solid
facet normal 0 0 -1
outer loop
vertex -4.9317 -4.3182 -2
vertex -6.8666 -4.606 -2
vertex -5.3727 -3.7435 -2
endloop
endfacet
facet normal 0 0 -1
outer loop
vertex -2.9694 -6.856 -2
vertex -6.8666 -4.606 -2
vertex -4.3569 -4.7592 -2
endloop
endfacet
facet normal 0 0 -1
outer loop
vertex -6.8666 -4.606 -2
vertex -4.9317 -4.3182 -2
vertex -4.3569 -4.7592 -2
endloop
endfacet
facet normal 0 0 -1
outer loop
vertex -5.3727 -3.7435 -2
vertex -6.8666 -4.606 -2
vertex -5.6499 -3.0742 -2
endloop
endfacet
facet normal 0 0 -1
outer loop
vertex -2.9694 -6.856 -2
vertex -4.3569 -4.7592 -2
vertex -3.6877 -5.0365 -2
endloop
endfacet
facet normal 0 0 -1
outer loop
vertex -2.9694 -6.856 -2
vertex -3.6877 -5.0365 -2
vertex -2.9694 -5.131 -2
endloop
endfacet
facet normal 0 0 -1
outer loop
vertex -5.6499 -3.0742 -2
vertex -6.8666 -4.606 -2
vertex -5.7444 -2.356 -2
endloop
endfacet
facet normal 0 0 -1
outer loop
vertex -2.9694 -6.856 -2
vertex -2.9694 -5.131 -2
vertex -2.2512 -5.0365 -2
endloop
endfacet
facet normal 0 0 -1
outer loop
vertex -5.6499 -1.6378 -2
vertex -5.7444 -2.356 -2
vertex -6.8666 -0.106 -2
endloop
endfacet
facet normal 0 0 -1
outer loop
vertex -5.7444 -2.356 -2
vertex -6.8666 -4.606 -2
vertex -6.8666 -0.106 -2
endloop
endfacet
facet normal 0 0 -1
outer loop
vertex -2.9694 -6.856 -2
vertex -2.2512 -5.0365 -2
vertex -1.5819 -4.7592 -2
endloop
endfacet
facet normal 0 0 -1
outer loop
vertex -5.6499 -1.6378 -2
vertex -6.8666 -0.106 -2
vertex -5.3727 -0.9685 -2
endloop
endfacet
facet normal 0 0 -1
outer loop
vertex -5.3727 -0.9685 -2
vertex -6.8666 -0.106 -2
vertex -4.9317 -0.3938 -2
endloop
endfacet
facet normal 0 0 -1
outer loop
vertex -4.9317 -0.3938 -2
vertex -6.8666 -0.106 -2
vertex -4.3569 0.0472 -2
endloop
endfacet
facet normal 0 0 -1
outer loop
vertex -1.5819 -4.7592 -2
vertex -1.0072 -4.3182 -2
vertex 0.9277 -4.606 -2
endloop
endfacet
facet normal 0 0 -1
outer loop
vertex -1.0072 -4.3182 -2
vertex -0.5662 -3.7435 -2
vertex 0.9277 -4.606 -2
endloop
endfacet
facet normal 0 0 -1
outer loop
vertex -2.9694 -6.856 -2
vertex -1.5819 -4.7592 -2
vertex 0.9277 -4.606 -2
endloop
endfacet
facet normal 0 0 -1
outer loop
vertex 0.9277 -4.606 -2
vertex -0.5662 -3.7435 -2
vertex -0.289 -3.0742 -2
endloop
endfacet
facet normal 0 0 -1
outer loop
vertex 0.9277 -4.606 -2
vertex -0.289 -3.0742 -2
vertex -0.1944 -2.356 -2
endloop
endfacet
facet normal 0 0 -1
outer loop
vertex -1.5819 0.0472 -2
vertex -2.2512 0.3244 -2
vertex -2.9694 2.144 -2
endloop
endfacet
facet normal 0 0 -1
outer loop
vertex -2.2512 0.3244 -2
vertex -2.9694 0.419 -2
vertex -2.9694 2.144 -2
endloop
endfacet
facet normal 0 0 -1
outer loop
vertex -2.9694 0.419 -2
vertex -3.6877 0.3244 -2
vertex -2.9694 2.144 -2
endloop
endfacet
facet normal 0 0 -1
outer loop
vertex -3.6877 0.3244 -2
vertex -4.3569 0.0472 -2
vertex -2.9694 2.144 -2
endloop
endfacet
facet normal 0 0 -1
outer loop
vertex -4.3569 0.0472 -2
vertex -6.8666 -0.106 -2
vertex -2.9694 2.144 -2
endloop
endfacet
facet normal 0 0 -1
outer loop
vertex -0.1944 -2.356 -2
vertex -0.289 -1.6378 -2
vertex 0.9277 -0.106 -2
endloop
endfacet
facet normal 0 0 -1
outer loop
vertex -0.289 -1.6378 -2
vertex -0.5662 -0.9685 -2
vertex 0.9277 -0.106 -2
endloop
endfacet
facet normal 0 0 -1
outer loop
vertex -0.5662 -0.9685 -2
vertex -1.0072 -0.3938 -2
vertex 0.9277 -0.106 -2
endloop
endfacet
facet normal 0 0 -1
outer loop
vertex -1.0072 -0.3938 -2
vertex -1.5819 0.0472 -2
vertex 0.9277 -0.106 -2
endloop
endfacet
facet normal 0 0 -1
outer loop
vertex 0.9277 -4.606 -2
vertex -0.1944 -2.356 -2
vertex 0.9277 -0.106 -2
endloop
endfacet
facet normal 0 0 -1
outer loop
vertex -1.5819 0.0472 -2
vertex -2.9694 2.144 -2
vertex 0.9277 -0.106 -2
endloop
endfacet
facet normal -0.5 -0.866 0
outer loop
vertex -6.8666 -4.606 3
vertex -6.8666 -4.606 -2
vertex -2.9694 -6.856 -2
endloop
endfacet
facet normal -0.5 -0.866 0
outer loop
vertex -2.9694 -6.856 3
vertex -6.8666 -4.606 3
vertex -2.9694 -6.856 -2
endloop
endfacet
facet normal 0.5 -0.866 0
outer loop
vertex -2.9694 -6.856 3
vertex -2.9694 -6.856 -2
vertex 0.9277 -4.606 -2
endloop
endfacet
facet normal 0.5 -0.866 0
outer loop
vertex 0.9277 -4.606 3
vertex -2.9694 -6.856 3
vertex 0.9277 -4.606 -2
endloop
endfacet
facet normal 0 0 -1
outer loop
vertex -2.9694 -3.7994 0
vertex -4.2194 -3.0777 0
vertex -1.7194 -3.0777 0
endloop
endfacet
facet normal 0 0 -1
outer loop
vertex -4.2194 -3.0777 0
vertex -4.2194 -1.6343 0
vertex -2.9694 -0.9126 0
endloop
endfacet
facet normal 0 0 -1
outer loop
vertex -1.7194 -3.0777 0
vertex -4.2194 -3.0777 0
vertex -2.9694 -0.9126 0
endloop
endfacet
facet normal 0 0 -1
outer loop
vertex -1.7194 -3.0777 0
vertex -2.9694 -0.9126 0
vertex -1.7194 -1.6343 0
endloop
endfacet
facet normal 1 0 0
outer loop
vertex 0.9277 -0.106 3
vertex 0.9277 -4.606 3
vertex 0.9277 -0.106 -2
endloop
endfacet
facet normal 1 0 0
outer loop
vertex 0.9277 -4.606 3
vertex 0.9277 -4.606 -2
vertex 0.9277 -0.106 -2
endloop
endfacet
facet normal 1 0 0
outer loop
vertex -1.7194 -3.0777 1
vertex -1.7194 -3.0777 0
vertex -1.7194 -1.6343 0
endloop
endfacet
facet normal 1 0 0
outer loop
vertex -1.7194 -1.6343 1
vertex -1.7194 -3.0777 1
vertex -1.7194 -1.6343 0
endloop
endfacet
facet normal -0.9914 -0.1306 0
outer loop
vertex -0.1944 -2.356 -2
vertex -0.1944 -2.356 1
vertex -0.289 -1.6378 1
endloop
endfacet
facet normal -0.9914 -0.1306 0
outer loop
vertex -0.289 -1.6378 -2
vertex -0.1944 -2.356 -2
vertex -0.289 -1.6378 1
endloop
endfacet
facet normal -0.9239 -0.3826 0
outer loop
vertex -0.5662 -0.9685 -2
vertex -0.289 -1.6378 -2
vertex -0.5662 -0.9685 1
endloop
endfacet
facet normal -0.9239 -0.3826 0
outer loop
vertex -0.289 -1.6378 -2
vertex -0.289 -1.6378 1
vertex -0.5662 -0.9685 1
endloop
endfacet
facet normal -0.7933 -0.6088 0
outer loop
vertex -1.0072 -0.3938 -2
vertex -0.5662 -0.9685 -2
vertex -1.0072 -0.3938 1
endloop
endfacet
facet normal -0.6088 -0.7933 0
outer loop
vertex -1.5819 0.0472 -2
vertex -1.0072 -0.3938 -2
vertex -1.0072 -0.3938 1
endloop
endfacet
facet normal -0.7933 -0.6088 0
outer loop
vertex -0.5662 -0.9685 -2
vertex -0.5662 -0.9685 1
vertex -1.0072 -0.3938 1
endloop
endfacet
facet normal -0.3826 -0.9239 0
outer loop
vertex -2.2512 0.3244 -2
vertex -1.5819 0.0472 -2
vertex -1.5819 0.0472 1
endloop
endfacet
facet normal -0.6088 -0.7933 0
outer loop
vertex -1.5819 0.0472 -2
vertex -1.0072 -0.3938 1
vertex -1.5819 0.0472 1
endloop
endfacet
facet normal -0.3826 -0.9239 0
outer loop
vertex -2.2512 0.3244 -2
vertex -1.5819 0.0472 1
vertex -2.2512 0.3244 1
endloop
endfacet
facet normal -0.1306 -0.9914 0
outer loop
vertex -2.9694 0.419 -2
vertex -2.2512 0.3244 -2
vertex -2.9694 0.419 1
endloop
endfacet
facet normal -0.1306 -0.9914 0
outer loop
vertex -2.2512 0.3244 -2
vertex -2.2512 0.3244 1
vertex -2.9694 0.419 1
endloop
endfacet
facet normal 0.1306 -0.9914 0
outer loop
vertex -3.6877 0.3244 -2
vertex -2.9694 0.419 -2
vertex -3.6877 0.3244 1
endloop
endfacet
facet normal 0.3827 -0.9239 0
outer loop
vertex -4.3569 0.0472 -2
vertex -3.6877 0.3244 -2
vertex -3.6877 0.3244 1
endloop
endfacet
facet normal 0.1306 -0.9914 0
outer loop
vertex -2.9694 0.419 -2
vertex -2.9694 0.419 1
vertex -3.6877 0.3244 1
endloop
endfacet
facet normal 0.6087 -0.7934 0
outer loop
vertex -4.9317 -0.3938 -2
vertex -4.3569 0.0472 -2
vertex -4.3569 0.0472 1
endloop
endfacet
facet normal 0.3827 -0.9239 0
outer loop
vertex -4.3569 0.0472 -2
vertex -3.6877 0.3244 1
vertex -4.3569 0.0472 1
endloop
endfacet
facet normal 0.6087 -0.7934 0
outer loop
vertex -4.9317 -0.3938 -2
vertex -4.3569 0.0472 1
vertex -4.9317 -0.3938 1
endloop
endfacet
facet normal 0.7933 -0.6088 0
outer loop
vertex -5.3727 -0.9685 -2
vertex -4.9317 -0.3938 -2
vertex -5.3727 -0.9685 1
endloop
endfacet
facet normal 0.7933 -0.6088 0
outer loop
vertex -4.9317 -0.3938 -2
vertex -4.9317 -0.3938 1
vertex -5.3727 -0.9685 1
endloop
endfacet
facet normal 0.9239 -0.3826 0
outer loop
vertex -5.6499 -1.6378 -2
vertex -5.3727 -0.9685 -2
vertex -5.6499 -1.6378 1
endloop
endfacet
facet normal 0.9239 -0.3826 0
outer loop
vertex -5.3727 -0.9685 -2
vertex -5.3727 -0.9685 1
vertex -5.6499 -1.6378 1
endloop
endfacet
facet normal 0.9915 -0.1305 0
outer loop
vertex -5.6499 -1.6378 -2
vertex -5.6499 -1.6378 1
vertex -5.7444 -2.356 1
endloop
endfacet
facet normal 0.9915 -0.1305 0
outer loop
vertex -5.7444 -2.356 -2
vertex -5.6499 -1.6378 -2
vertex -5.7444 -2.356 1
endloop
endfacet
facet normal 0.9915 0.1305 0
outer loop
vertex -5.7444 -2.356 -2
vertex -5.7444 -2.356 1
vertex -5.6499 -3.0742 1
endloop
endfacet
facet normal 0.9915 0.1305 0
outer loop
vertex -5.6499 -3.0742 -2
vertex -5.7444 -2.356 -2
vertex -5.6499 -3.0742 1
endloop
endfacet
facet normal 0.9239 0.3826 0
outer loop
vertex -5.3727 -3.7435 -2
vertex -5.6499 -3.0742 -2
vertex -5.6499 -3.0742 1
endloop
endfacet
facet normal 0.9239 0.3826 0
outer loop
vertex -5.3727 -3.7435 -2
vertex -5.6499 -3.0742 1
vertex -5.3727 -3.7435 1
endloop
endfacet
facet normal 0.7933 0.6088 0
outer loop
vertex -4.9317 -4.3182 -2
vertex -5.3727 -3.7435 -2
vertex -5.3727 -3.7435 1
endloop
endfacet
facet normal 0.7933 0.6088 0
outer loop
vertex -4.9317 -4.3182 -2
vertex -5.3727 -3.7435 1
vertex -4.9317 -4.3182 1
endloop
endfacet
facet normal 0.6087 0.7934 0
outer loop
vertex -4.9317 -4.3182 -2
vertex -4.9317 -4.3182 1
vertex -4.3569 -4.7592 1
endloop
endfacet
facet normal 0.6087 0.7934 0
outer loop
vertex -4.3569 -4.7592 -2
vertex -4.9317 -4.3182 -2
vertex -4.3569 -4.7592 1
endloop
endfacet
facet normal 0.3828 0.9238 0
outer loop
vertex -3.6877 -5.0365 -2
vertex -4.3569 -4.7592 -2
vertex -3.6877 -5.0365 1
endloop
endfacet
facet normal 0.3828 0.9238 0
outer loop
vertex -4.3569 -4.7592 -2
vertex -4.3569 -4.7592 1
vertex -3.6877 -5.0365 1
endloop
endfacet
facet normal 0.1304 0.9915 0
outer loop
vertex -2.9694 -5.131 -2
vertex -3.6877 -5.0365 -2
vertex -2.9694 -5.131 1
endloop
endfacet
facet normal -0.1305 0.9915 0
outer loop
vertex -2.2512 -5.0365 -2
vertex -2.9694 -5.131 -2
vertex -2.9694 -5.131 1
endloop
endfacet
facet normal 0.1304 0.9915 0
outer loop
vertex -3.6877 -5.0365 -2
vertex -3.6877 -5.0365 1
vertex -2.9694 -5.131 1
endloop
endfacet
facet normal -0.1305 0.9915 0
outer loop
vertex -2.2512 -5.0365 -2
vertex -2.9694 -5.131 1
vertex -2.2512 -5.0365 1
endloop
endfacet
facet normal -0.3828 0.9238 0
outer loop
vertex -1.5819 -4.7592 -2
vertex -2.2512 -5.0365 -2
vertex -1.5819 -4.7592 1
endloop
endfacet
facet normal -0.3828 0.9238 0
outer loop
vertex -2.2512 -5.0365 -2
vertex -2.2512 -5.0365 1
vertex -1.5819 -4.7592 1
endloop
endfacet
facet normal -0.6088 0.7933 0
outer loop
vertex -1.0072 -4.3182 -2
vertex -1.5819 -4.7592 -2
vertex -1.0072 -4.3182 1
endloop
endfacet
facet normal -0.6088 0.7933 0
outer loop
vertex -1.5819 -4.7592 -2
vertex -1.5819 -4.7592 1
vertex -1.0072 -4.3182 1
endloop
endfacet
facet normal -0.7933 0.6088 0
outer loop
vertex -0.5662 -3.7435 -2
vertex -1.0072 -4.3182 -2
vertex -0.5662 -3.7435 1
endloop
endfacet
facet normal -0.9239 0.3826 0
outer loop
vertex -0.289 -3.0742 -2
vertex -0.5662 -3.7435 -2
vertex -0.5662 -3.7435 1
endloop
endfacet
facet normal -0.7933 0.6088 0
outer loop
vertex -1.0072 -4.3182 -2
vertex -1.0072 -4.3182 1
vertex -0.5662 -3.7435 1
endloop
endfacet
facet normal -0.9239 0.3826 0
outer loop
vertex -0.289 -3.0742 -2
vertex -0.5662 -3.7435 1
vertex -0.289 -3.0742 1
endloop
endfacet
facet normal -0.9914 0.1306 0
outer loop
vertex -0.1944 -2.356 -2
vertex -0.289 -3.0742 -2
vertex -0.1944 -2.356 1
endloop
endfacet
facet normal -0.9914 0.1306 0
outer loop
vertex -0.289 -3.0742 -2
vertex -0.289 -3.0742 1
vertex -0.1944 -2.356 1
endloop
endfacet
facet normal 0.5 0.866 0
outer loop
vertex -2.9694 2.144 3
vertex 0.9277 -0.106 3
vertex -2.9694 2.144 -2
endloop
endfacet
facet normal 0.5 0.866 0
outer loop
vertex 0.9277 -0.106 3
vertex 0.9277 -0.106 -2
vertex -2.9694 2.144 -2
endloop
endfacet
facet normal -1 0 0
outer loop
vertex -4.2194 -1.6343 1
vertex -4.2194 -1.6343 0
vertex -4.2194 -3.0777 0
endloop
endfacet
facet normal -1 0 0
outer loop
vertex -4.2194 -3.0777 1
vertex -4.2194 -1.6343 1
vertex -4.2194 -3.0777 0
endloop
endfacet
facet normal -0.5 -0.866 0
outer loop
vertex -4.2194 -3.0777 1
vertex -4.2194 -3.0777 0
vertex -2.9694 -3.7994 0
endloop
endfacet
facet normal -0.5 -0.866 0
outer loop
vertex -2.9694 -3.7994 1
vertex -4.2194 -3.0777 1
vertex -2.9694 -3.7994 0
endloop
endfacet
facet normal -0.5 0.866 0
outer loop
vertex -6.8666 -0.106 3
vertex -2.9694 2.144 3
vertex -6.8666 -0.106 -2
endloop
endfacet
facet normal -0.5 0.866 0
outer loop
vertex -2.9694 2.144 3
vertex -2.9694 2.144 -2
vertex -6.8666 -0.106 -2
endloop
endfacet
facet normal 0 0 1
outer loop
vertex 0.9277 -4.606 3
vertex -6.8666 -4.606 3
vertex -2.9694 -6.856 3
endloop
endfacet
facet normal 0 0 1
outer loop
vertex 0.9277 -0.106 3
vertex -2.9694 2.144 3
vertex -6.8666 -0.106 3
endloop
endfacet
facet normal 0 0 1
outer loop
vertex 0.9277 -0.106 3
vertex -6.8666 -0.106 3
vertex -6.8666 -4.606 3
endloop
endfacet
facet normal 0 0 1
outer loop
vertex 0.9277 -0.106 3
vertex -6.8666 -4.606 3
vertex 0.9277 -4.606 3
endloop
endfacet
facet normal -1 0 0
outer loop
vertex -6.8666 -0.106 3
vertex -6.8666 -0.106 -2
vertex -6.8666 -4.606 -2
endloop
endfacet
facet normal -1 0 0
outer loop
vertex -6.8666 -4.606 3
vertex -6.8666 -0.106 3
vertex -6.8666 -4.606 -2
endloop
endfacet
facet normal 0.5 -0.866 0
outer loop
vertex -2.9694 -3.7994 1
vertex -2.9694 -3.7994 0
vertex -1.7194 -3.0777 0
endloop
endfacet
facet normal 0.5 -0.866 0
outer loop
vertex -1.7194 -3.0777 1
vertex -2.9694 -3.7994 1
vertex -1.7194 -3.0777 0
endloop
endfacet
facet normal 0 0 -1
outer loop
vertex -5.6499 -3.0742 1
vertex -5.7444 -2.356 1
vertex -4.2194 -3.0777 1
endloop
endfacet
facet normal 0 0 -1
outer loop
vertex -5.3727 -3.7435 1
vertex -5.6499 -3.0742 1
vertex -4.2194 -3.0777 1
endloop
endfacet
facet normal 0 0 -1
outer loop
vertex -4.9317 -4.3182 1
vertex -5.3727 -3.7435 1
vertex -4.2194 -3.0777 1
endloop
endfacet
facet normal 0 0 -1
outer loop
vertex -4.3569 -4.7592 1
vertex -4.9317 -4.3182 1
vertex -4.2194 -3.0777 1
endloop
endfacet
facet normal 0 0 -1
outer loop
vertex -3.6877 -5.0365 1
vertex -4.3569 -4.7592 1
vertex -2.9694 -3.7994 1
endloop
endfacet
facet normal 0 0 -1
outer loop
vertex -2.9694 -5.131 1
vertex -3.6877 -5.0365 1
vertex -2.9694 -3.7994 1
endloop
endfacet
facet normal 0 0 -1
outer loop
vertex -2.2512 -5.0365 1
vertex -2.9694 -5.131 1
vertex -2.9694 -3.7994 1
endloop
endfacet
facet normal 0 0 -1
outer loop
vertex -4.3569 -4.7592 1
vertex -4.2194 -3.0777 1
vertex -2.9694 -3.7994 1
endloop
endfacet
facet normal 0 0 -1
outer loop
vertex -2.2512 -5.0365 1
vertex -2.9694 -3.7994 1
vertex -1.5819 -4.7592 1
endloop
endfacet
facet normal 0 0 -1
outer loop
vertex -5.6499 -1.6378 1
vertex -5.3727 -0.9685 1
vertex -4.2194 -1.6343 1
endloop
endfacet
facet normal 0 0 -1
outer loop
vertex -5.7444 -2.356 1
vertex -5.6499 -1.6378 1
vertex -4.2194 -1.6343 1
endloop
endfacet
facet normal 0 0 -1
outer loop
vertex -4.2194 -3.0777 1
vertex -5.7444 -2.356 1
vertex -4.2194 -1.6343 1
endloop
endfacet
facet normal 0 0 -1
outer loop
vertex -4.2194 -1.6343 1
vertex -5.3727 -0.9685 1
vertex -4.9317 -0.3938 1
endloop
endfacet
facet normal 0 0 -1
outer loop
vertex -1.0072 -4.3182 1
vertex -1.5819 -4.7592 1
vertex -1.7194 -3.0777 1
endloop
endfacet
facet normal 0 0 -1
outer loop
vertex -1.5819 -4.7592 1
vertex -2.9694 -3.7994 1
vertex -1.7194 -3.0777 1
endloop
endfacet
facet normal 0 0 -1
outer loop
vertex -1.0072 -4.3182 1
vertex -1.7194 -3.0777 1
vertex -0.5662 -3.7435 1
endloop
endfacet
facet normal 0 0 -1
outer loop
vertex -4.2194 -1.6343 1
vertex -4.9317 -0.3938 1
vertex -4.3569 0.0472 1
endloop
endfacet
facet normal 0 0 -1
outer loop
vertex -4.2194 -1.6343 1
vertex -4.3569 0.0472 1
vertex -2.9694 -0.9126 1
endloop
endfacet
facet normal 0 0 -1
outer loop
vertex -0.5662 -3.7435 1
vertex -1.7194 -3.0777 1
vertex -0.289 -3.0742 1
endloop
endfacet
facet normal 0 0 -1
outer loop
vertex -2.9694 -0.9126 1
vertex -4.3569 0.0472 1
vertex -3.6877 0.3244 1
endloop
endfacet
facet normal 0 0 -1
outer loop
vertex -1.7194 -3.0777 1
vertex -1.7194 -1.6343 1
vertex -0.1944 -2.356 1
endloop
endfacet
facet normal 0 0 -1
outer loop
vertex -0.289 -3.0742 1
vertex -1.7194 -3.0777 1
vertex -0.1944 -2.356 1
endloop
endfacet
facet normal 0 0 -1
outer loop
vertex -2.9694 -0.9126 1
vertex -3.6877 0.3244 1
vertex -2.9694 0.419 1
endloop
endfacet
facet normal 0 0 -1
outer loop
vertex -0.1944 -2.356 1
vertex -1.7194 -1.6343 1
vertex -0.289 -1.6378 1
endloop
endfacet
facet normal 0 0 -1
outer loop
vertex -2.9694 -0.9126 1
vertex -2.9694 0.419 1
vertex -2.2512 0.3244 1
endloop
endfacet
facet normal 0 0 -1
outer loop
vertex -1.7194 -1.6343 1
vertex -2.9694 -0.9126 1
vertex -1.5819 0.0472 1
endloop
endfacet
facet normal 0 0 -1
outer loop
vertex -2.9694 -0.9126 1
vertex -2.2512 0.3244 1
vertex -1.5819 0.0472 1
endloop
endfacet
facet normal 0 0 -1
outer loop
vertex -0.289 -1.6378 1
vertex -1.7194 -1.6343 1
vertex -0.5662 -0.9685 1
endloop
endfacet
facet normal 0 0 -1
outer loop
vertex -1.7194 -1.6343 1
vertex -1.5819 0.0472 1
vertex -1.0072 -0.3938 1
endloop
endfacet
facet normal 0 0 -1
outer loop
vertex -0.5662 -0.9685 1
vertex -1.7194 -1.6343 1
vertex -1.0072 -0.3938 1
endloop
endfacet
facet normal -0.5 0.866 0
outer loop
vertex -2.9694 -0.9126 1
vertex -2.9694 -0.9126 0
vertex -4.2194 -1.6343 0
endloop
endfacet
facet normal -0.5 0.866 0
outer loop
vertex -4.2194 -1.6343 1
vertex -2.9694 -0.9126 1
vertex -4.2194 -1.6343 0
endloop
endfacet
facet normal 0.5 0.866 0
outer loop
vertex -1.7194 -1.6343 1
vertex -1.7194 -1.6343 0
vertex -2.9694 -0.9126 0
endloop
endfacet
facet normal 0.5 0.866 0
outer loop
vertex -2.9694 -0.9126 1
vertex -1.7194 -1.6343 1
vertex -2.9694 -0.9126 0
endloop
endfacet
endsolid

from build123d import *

# Parameters (mm, degrees)
BOSS_EXTRUDE1_DEPTH = 1
SKETCH2_R           = 2.775
BOSS_EXTRUDE2_DEPTH = 3
BOSS_EXTRUDE3_DEPTH = 2


with BuildPart() as part:
    # Sketch1 → Boss-Extrude1 (new body)
    with BuildSketch(Plane.XY):
        Polygon((-1.71944816, -3.077706513), (-1.71944816, -1.63433084), (-2.96944816, -0.912643004), (-4.21944816, -1.63433084), (-4.21944816, -3.077706513), (-2.96944816, -3.79939435), align=None)
    extrude(amount=BOSS_EXTRUDE1_DEPTH)



with BuildPart() as body_2:
    # Sketch2 → Boss-Extrude2 (new body)
    with BuildSketch(Plane.XY.offset(1)):
        Polygon((-2.96944816, -6.856018677), (0.927666157, -4.606018677), (0.927666157, -0.106018677), (-2.96944816, 2.143981323), (-6.866562477, -0.106018677), (-6.866562477, -4.606018677), align=None)
        with Locations((-2.96944816, -2.356018677)):
            Circle(SKETCH2_R, mode=Mode.SUBTRACT)
    extrude(amount=-BOSS_EXTRUDE2_DEPTH)


with BuildPart() as part_1:
    add(part.part)

    add(body_2.part)  # Boss-Extrude3 merges body 2
    # Sketch3 → Boss-Extrude3 (add)
    with BuildSketch(Plane.XY.offset(1)):
        Polygon((-2.96944816, -6.856018677), (0.927666157, -4.606018677), (0.927666157, -0.106018677), (-2.96944816, 2.143981323), (-6.866562477, -0.106018677), (-6.866562477, -4.606018677), align=None)
    extrude(amount=BOSS_EXTRUDE3_DEPTH)


solid = part_1.part
